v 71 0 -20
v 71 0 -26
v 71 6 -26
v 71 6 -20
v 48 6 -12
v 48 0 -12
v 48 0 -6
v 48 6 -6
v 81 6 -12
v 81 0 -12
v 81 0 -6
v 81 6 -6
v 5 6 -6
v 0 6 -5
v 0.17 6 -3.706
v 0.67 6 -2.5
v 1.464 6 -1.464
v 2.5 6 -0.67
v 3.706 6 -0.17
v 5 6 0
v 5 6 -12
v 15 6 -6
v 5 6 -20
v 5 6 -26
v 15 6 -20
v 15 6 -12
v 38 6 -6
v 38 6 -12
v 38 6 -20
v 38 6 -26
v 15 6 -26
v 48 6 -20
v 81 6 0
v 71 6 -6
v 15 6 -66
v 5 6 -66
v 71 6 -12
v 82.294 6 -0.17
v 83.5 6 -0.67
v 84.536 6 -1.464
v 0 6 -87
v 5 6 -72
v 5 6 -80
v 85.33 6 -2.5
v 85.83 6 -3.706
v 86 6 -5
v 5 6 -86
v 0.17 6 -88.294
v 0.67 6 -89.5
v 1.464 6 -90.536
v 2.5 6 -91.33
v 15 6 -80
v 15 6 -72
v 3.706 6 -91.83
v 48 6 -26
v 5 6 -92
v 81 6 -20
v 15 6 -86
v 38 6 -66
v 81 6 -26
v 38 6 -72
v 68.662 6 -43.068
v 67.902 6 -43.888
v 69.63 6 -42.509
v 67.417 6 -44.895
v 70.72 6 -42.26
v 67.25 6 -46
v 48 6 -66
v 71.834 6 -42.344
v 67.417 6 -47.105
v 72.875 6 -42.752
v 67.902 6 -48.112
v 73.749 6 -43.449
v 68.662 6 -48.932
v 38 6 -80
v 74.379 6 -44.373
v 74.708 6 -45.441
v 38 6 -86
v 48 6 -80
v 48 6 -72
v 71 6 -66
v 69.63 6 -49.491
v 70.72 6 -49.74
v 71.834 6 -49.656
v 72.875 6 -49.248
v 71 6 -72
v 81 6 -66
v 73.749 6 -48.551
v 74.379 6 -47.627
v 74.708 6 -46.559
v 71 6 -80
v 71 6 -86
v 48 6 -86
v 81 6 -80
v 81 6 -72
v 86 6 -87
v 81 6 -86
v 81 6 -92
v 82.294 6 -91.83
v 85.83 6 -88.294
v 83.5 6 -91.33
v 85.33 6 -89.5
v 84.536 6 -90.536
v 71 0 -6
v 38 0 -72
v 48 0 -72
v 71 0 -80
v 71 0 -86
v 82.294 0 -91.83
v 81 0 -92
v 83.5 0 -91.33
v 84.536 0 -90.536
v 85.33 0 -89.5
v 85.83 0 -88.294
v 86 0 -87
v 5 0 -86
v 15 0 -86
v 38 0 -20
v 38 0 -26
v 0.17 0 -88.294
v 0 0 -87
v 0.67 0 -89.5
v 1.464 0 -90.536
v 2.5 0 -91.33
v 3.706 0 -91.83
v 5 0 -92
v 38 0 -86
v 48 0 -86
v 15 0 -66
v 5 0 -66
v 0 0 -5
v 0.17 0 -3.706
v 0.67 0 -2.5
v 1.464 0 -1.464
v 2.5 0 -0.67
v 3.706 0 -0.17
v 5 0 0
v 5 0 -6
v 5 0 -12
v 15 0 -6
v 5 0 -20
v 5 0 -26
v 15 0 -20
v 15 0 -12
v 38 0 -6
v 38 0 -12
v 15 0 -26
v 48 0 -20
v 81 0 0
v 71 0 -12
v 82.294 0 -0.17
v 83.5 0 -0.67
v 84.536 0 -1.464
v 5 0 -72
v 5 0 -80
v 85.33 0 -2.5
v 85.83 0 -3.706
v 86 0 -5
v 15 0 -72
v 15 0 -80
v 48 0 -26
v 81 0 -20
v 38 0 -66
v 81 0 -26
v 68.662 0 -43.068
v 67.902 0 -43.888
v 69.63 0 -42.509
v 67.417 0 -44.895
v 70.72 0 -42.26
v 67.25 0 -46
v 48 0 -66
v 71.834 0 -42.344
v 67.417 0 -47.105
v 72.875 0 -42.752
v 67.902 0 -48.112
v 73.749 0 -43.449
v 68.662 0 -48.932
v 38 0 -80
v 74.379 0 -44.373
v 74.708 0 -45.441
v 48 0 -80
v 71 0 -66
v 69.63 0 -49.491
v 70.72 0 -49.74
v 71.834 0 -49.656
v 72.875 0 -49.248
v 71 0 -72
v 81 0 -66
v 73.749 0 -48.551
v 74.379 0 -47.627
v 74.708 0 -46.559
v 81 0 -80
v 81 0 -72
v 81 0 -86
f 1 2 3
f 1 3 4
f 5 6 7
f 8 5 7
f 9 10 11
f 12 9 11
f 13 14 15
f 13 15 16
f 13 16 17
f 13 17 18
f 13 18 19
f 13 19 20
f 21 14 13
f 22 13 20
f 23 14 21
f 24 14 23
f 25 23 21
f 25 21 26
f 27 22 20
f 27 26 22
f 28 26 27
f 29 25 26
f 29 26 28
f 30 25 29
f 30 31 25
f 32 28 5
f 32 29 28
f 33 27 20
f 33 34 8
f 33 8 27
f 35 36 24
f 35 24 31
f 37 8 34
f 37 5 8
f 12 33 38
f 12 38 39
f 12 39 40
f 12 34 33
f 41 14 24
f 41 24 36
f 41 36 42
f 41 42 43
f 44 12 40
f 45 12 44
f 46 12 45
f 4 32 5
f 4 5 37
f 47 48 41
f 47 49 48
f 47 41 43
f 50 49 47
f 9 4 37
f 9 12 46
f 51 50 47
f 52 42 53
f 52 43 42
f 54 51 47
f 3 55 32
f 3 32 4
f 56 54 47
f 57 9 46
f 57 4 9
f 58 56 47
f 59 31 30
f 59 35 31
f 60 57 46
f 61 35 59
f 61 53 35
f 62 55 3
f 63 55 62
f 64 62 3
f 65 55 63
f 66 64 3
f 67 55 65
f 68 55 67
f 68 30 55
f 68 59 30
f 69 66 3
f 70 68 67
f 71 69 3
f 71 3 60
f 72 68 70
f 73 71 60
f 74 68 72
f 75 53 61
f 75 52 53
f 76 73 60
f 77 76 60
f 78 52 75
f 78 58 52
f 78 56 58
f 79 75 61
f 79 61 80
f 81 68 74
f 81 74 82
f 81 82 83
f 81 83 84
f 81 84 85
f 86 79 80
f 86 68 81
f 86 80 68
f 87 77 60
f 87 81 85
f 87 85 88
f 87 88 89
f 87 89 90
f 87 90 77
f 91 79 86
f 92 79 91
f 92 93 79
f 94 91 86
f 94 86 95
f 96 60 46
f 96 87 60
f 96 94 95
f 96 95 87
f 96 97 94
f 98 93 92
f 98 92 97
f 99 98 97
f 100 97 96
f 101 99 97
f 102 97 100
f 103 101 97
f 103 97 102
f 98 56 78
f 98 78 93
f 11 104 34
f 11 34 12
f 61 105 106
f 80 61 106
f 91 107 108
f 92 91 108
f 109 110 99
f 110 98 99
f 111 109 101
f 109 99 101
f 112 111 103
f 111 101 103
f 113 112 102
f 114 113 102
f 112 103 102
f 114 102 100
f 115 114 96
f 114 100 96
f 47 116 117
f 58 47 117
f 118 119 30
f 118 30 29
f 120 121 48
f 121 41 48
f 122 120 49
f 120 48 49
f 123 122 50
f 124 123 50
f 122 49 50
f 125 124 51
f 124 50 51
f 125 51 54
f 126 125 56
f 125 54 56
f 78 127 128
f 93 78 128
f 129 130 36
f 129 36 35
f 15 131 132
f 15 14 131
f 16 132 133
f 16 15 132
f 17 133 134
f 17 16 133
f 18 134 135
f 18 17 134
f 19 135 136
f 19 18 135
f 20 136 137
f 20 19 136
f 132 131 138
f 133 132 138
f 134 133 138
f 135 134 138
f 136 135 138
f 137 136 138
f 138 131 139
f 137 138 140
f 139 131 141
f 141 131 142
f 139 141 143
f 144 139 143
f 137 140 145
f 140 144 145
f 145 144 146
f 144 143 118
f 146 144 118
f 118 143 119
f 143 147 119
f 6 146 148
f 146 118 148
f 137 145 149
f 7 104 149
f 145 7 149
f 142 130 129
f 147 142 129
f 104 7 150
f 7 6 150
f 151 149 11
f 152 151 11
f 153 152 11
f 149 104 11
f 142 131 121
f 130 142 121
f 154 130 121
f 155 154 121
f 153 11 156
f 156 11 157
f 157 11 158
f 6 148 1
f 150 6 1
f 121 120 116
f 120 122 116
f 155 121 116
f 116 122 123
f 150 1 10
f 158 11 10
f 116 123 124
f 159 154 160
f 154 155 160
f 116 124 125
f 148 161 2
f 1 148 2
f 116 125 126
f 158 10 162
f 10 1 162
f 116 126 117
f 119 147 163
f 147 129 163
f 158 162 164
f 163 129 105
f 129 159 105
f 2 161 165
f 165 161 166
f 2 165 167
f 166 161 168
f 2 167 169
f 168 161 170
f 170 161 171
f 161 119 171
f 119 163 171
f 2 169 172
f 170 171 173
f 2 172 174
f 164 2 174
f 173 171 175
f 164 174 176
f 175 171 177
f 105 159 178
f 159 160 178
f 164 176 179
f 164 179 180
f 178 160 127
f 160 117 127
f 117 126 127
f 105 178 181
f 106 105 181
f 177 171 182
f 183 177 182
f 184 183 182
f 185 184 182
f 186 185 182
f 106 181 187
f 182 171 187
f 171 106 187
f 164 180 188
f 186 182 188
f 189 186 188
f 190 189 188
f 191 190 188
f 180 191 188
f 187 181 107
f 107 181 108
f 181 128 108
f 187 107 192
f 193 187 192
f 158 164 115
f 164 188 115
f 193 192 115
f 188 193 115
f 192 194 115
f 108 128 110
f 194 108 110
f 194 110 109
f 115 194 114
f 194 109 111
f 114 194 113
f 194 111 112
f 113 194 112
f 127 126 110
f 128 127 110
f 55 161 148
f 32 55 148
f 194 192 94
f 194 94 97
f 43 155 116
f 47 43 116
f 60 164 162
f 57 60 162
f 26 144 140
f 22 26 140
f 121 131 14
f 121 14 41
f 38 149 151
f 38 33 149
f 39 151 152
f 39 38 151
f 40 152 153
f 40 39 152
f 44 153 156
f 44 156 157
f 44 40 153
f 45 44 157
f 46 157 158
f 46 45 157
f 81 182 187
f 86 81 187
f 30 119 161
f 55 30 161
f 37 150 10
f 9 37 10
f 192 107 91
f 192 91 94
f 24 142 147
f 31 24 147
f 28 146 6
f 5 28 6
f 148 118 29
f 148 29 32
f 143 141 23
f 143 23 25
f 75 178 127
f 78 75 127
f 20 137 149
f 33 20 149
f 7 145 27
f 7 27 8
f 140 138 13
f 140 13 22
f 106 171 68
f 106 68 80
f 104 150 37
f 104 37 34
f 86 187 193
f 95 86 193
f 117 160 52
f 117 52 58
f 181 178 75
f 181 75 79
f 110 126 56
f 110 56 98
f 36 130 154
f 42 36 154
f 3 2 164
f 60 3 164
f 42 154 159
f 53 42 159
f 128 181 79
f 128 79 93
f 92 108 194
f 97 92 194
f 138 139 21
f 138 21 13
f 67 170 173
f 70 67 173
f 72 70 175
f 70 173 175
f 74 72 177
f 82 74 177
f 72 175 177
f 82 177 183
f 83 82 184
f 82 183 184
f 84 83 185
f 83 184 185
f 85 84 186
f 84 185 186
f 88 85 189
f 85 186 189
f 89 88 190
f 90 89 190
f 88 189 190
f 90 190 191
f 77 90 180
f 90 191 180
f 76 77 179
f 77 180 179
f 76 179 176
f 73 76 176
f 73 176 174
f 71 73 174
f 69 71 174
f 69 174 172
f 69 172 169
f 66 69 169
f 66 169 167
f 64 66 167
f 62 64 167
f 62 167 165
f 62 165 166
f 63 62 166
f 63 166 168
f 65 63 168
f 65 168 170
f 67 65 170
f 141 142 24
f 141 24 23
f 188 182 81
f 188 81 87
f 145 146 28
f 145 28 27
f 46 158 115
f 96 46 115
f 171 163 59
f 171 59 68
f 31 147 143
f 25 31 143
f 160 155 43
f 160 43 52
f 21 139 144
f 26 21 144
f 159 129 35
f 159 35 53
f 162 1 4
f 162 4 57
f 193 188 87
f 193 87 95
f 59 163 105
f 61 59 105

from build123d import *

# Parameters (mm, degrees)
SKETCH1_W                  = 86
SKETCH1_H                  = 92
BOSS_EXTRUDE1_DEPTH        = 6
F_7_5_7_5_DIAMETER_HOLE1_D = 7.5
SKETCH6_W                  = 10
SKETCH6_H                  = 6
CUT_EXTRUDE1_DEPTH         = 4
SKETCH61_W                 = 10
SKETCH61_H                 = 6
CUT_EXTRUDE11_DEPTH        = 4
SKETCH62_W                 = 10
SKETCH62_H                 = 6
CUT_EXTRUDE12_DEPTH        = 4
SKETCH64_W                 = 10
SKETCH64_H                 = 6
CUT_EXTRUDE14_DEPTH        = 4
SKETCH65_W                 = 10
SKETCH65_H                 = 6
CUT_EXTRUDE15_DEPTH        = 4
SKETCH66_W                 = 10
SKETCH66_H                 = 6
CUT_EXTRUDE16_DEPTH        = 4
FILLET1_R                  = 5


with BuildPart() as part:
    # Sketch1 → Boss-Extrude1 (new body)
    with BuildSketch(Plane(origin=(0, 0, 0), x_dir=(1, 0, 0), z_dir=(0, 1, 0))):
        with Locations((43, 46)):
            Rectangle(SKETCH1_W, SKETCH1_H)
    extrude(amount=BOSS_EXTRUDE1_DEPTH)

    # Ø7.5 (7.5) Diameter Hole1 (through all)
    with Locations(Plane(origin=(0, 6, 0), x_dir=(1, 0, 0), z_dir=(0, 1, 0))):
        with Locations((71, 46)):
            Hole(F_7_5_7_5_DIAMETER_HOLE1_D / 2)

    # Sketch6 → Cut-Extrude1 (cut, symmetric)
    with BuildSketch(Plane(origin=(9.232221392, 3, 35), x_dir=(1, 0, 0), z_dir=(0, -1, 0))):
        with Locations((0.767778608, -44)):
            Rectangle(SKETCH6_W, SKETCH6_H)
    cut_extrude1 = extrude(amount=CUT_EXTRUDE1_DEPTH, both=True, mode=Mode.SUBTRACT)

    # Sketch61 → Cut-Extrude11 (cut, symmetric)
    with BuildSketch(Plane(origin=(42.232221392, 3, 35), x_dir=(1, 0, 0), z_dir=(0, -1, 0))):
        with Locations((0.767778608, -44)):
            Rectangle(SKETCH61_W, SKETCH61_H)
    cut_extrude11 = extrude(amount=CUT_EXTRUDE11_DEPTH, both=True, mode=Mode.SUBTRACT)

    # Sketch62 → Cut-Extrude12 (cut, symmetric)
    with BuildSketch(Plane(origin=(75.232221392, 3, 35), x_dir=(1, 0, 0), z_dir=(0, -1, 0))):
        with Locations((0.767778608, -44)):
            Rectangle(SKETCH62_W, SKETCH62_H)
    cut_extrude12 = extrude(amount=CUT_EXTRUDE12_DEPTH, both=True, mode=Mode.SUBTRACT)

    # Sketch64 → Cut-Extrude14 (cut, symmetric)
    with BuildSketch(Plane(origin=(9.232221392, 3, 21), x_dir=(1, 0, 0), z_dir=(0, -1, 0))):
        with Locations((0.767778608, -44)):
            Rectangle(SKETCH64_W, SKETCH64_H)
    cut_extrude14 = extrude(amount=CUT_EXTRUDE14_DEPTH, both=True, mode=Mode.SUBTRACT)

    # Sketch65 → Cut-Extrude15 (cut, symmetric)
    with BuildSketch(Plane(origin=(42.232221392, 3, 21), x_dir=(1, 0, 0), z_dir=(0, -1, 0))):
        with Locations((0.767778608, -44)):
            Rectangle(SKETCH65_W, SKETCH65_H)
    cut_extrude15 = extrude(amount=CUT_EXTRUDE15_DEPTH, both=True, mode=Mode.SUBTRACT)

    # Sketch66 → Cut-Extrude16 (cut, symmetric)
    with BuildSketch(Plane(origin=(75.232221392, 3, 21), x_dir=(1, 0, 0), z_dir=(0, -1, 0))):
        with Locations((0.767778608, -44)):
            Rectangle(SKETCH66_W, SKETCH66_H)
    cut_extrude16 = extrude(amount=CUT_EXTRUDE16_DEPTH, both=True, mode=Mode.SUBTRACT)

    # Mirror1: Cut-Extrude1, Cut-Extrude11, Cut-Extrude12, Cut-Extrude14, Cut-Extrude15, Cut-Extrude16 across plane
    add(cut_extrude1.mirror(Plane.XY.offset(-46)), mode=Mode.SUBTRACT)
    add(cut_extrude11.mirror(Plane.XY.offset(-46)), mode=Mode.SUBTRACT)
    add(cut_extrude12.mirror(Plane.XY.offset(-46)), mode=Mode.SUBTRACT)
    add(cut_extrude14.mirror(Plane.XY.offset(-46)), mode=Mode.SUBTRACT)
    add(cut_extrude15.mirror(Plane.XY.offset(-46)), mode=Mode.SUBTRACT)
    add(cut_extrude16.mirror(Plane.XY.offset(-46)), mode=Mode.SUBTRACT)

    # Fillet1
    fillet1_edges = [part.edges().sort_by_distance(p)[0] for p in [
        (0, 3, -92),
        (86, 3, -92),
        (86, 3, 0),
        (0, 3, 0),
    ]]
    fillet(fillet1_edges, radius=FILLET1_R)


solid = part.part
